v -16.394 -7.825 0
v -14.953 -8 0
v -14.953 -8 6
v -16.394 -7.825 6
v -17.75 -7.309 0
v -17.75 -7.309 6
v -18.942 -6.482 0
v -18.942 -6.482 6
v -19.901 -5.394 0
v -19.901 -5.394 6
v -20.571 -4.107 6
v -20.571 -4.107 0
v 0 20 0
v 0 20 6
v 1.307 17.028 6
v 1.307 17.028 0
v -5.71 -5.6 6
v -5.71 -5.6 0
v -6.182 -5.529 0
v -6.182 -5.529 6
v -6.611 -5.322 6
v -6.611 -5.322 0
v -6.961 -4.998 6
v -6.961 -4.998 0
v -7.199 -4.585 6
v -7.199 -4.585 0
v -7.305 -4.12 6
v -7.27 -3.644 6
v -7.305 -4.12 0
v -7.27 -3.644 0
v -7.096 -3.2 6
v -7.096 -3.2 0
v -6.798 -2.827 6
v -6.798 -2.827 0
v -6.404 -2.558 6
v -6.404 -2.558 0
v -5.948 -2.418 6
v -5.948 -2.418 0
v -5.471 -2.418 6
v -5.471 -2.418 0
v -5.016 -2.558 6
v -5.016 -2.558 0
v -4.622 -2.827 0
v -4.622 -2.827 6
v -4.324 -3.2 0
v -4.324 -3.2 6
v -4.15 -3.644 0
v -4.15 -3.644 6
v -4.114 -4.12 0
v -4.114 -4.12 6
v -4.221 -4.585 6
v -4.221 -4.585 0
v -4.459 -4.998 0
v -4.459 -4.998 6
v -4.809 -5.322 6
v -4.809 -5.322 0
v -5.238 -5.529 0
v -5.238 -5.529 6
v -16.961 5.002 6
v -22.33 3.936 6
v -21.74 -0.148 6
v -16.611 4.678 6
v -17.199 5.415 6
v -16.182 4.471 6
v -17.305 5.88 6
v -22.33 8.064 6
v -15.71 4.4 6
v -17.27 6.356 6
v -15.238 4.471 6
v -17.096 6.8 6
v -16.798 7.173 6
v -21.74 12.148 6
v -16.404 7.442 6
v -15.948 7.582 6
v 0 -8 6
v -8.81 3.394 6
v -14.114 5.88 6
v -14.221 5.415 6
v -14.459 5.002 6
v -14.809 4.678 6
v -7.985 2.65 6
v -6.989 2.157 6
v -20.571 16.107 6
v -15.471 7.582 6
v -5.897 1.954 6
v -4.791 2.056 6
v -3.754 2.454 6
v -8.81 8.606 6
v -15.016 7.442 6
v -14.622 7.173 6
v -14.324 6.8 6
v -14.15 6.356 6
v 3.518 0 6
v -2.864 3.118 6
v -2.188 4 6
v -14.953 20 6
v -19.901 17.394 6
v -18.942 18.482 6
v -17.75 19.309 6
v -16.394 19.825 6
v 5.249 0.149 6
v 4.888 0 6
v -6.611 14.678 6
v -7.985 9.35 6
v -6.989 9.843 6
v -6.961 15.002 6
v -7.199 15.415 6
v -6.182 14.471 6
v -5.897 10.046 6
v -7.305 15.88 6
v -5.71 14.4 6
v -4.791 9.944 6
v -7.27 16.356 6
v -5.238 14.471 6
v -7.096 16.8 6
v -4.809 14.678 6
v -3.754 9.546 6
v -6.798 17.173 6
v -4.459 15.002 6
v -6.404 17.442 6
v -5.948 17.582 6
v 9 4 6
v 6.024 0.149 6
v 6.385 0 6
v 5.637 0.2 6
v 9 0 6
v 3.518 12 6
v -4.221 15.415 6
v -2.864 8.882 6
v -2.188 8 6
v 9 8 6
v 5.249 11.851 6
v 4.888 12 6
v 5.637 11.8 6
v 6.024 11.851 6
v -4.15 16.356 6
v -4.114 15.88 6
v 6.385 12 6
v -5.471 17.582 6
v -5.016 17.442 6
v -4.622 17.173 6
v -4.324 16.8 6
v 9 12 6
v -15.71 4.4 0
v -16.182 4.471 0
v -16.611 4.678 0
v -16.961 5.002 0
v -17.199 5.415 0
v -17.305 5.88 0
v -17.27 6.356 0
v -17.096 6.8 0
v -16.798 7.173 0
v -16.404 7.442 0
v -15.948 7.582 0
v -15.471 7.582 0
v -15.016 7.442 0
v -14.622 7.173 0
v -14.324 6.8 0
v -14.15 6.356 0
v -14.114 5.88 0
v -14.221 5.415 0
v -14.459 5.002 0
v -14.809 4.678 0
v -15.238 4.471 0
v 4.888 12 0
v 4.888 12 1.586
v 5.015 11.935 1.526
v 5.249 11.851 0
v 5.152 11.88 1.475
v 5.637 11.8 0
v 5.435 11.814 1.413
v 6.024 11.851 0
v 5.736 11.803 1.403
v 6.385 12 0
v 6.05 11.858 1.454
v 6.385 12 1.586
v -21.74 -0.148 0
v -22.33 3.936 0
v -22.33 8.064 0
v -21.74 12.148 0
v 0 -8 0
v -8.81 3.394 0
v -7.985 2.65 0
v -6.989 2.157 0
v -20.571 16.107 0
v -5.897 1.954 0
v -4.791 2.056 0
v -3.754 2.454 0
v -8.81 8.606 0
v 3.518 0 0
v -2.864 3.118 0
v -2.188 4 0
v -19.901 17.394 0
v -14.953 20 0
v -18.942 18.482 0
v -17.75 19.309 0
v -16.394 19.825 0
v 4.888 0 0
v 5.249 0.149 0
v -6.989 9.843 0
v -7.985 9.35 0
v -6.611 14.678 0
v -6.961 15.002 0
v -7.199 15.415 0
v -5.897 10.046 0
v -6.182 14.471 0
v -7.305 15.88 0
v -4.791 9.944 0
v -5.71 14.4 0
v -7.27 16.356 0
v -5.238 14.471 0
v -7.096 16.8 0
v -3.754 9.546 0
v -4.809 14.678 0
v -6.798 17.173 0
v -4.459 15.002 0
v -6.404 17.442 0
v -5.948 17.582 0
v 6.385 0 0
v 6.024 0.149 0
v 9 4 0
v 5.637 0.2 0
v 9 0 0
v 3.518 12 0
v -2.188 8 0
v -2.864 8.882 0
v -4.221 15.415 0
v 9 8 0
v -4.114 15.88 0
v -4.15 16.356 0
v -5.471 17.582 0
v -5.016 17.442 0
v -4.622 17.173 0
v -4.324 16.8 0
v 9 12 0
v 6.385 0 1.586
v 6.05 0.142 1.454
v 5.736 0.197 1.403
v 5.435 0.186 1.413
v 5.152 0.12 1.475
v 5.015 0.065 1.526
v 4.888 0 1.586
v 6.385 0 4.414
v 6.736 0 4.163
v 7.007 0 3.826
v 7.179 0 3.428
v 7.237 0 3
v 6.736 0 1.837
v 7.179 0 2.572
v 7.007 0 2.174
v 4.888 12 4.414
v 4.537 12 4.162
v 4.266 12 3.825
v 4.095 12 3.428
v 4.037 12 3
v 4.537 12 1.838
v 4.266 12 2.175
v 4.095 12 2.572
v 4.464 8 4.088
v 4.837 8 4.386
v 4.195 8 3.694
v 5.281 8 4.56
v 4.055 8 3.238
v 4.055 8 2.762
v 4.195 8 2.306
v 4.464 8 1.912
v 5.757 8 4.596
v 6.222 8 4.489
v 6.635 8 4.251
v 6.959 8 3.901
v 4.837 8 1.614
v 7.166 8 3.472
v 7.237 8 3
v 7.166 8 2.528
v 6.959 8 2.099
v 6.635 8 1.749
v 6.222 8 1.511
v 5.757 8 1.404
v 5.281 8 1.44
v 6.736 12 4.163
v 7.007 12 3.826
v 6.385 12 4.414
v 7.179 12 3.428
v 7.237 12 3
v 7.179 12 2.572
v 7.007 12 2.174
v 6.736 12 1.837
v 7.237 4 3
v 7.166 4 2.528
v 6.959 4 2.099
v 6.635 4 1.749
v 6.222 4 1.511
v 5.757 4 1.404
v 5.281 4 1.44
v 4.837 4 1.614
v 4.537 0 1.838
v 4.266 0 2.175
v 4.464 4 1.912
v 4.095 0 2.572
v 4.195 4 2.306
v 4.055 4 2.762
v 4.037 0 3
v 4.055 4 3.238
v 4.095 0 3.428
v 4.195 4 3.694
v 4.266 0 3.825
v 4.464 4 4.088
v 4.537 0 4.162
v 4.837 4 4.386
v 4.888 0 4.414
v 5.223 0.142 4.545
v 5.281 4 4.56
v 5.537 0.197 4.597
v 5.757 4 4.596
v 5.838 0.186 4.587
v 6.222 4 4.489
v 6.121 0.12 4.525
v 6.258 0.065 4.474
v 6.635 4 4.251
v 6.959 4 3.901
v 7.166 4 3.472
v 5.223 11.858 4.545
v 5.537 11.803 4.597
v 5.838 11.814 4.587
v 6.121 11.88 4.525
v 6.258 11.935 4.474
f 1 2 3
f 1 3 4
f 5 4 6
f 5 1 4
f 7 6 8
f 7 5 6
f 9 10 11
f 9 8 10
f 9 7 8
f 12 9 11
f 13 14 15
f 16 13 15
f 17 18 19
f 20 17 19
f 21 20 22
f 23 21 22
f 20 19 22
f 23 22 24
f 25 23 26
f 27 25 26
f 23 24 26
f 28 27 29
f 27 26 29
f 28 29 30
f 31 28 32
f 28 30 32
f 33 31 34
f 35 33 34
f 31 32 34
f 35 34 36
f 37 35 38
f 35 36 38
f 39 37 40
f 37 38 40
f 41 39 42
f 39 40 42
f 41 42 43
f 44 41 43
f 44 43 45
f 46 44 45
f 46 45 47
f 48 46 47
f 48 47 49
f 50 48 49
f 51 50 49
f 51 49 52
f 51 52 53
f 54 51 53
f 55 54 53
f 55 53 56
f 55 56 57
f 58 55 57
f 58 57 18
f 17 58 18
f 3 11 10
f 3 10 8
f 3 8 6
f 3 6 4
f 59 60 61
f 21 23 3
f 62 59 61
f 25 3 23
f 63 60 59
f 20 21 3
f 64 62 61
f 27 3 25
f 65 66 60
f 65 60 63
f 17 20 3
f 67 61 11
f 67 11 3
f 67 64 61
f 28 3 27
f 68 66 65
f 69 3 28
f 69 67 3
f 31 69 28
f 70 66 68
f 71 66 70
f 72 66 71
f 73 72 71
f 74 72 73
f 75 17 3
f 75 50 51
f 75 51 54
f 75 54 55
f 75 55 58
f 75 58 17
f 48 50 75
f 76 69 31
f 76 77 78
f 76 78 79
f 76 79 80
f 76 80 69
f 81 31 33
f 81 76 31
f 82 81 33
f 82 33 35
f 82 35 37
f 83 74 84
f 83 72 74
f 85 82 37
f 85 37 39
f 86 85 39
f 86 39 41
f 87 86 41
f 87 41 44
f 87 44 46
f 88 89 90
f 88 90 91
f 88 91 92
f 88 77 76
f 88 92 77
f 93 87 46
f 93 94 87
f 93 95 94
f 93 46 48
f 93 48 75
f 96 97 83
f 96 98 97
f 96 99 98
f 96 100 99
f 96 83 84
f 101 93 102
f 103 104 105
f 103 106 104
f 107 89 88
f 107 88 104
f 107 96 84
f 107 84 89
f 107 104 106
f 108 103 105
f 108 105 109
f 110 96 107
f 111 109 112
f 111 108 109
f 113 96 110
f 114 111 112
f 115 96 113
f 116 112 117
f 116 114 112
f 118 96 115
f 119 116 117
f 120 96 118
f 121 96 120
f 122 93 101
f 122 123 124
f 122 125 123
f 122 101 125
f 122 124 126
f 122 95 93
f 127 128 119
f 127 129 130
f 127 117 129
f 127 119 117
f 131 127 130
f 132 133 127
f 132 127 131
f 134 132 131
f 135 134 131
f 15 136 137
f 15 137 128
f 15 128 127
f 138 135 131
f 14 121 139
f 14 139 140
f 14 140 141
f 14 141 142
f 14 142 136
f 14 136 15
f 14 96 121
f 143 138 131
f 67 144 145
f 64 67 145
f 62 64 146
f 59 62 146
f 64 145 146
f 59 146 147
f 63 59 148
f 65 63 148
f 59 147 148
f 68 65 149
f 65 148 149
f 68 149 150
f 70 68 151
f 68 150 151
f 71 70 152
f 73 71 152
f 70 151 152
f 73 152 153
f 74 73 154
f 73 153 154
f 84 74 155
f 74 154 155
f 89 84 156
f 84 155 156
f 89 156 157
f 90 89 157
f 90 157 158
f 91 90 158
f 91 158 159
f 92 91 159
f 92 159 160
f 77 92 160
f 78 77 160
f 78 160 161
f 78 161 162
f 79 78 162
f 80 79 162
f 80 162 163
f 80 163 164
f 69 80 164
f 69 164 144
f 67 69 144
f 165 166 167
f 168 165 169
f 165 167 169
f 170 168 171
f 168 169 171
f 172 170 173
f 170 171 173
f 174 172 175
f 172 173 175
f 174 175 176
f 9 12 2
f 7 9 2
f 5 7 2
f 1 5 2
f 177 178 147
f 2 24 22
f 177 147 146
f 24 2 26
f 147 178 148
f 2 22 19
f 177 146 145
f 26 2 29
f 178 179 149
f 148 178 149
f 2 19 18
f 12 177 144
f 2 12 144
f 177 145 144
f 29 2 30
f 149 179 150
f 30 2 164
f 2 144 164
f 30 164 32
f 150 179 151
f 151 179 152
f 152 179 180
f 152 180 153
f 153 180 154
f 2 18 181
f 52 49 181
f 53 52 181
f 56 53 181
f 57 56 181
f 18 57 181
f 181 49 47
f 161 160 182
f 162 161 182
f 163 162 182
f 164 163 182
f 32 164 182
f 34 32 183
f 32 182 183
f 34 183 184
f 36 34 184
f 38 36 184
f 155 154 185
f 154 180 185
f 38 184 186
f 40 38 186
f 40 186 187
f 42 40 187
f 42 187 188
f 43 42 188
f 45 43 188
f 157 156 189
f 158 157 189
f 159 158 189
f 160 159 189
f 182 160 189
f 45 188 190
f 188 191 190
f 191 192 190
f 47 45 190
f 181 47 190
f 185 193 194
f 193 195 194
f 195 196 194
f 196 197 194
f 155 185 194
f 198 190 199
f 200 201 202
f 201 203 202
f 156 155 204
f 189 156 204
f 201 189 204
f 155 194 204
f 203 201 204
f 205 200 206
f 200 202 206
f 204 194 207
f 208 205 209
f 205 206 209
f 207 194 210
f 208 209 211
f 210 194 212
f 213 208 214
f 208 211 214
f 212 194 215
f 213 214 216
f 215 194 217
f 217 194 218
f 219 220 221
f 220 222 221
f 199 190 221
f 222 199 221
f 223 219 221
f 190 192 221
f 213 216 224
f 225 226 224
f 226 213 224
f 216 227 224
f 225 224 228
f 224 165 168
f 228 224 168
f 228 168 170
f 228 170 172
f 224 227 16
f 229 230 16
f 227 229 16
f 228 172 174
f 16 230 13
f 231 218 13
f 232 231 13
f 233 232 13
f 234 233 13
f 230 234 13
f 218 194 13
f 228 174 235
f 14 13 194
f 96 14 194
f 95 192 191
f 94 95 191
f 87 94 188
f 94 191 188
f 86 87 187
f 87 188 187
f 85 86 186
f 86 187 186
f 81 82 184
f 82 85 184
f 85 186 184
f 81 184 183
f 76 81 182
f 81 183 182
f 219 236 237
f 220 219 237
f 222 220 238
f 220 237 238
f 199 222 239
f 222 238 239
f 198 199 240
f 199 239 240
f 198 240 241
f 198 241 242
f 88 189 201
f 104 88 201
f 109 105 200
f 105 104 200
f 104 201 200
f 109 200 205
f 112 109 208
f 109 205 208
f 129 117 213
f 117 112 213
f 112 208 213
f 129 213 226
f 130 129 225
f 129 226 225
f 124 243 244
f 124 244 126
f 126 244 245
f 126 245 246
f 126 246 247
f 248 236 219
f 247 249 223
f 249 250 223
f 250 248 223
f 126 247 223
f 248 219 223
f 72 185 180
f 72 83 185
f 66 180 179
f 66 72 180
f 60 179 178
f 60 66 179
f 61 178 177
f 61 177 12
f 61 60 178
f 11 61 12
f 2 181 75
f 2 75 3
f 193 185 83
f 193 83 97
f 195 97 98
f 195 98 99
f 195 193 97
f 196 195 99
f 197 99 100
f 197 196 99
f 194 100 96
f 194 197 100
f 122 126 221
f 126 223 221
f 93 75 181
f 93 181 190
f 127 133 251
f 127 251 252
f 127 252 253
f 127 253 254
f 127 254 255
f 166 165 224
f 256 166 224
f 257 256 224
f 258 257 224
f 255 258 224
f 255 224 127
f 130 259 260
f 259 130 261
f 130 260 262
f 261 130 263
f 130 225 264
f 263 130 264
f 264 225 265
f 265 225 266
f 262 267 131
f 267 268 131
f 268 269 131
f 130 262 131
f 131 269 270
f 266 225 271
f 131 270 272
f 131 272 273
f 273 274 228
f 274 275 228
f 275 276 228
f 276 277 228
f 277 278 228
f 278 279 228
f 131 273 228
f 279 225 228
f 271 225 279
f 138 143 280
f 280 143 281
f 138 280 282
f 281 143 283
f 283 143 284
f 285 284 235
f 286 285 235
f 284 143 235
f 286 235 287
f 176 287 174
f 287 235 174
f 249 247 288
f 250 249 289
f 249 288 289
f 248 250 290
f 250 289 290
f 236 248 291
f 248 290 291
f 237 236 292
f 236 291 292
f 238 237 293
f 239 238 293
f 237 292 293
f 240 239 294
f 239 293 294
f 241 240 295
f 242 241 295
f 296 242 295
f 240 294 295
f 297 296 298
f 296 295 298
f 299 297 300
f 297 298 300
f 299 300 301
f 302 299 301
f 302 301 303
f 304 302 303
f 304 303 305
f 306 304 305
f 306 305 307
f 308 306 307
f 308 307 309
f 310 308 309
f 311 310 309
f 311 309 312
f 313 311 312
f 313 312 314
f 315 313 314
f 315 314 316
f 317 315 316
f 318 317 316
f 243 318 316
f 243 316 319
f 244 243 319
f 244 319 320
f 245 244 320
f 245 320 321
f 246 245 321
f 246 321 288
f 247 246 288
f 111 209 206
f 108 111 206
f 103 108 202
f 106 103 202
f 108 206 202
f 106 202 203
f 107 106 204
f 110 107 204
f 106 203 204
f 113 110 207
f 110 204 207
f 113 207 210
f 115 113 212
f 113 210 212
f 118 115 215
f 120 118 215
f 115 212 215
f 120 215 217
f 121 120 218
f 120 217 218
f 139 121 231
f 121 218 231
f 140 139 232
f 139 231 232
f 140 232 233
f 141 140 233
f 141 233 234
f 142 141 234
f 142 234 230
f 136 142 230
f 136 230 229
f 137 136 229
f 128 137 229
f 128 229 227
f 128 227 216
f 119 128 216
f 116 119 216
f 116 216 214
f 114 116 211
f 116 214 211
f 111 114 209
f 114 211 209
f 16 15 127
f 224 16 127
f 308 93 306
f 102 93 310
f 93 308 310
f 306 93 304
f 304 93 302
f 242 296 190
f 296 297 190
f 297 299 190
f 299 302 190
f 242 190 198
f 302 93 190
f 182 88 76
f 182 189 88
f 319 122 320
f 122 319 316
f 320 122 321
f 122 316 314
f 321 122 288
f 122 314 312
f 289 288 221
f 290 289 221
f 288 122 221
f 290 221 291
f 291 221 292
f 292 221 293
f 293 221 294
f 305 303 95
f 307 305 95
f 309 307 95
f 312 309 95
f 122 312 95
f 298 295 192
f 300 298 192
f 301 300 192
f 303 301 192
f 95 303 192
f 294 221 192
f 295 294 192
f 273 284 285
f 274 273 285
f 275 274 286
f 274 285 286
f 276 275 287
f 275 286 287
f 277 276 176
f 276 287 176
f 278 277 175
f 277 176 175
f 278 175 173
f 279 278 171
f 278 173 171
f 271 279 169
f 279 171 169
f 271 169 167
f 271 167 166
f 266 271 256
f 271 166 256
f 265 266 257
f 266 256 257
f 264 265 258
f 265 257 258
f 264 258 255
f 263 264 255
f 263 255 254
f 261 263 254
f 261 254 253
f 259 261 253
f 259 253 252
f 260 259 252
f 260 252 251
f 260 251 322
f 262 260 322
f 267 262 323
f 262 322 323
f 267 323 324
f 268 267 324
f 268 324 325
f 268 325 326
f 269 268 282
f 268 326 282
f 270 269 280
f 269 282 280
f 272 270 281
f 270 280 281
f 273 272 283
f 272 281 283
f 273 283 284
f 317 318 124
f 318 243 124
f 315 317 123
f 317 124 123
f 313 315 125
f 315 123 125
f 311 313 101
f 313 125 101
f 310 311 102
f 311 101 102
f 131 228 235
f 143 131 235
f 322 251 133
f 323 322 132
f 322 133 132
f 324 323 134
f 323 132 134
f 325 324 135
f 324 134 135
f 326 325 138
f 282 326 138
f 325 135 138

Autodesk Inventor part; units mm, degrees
ref_plane "YZ Plane" through (0, 0, 0) normal (1, 0, 0) x (0, 1, 0)
ref_plane "XZ Plane" through (0, 0, 0) normal (0, 1, 0) x (-1, 0, 0)
ref_plane "XY Plane" through (0, 0, 0) normal (0, 0, 1) x (1, 0, 0)
sketch "スケッチ1" plane through (0, 0, 0) normal (0, 0, 1) x (1, 0, 0)
  line L0 (9, 0) -> (9, 4)
  line L1 (9, 12) -> (2.2731, 12)
  line L2 (0, 8) -> (9, 8)
  line L3 (0, 4) -> (9, 4)
  line L4 (9, 8) -> (9, 12)
  line L5 (2.2731, 12) -> (0, 14.2779)
  line L6 (2.2731, 0) -> (-5.7099, -8)
  line L7 (-5.7099, 20) -> (-15.7099, 20)
  line L8 (-5.7099, -8) -> (-15.7099, -8)
  line L9 (-15.7099, 20) -> (-25.7698, 20)
  line L10 (-25.7698, 20) -> (-25.7698, -8)
  line L11 (-25.7698, -8) -> (-15.7099, -8)
  line L12 (2.2731, 0) -> (9, 0)
  line L13 (0, 14.2779) -> (-5.7099, 20)
  arc A0 (-2.1881, 8) -> (-8.8099, 8.6062) centre (-5.7099, 6) ccw
  line L14 (0, 8) -> (-2.1881, 8)
  line L15 (0, 4) -> (-2.1881, 4)
  line L16 (-8.8099, 8.6062) -> (-8.8099, 3.3938)
  arc A1 (-8.8099, 3.3938) -> (-2.1881, 4) centre (-5.7099, 6) ccw
  point P0 (0, 0)
  point P1 (4.5, 12)
  point P2 (4.5, 0)
  point P3 (4.5, 4)
  point P4 (-25.7099, 6)
  point P5 (-8.8099, 6)
  dimension "d5" = 4
  dimension "d8" = 10
  dimension "d9" = 10
  dimension "d12" = 14
  dimension "d90" = 8.1
  dimension "d91" = 3.1
extrude "押し出し1" add sketch "スケッチ1" along normal blind 6
sketch "スケッチ2" plane through (0, 0, 6) normal (0, 0, 1) x (1, 0, 0)
  circle A0 centre (5.6365, 13.3) radius 1.5
  line L0 (9, 8) -> (9, 12) projected
  line L1 (11.5477, 6) -> (-28.1936, 6) construction
  line L2 (9, 12) -> (2.2731, 12) projected
  circle A1 centre (5.6365, -1.3) radius 1.5
  point P0 (0, 0)
  point P1 (4.8882, 12)
  point P2 (6.3849, 12)
  dimension "d15" = 3
  dimension "d16" = 3.3635
  dimension "d17" = 1.3
extrude "押し出し2" cut sketch "スケッチ2" against normal blind 6 contours A0 L2 | A1 picked at (5.4614, 13.0013)
sketch "スケッチ3" plane through (0, 0, 6) normal (0, 0, 1) x (1, 0, 0)
  circle A0 centre (5.6365, 13.3) radius 1.5
  line L0 (9, 12) -> (2.2731, 12) projected
  point P0 (0, 0)
  point P1 (4.8882, 12)
  point P2 (6.3849, 12)
  dimension "d20" = 3
  dimension "d21" = 1.3
extrude "押し出し3" add sketch "スケッチ3" against normal blind 6 contours A0 L0 picked at (5.4614, 13.0013)
sketch "スケッチ4" plane through (0, 0, 6) normal (0, 0, 1) x (1, 0, 0)
  arc A0 (6.3849, 12) -> (4.8882, 12) centre (5.6365, 13.3) ccw projected
  circle A1 centre (5.6365, 13.3) radius 1.5
  point P0 (0, 0)
  dimension "d24" = 3
extrude "押し出し4" cut sketch "スケッチ4" against normal blind 6
fillet "フィレット1" radius 5 1 edges at (-25.7698, 20, 3)
fillet "フィレット2" radius 5 1 edges at (-25.7698, -8, 3)
fillet "フィレット3" radius 3 4 edges at (-5.7099, -8, 3) (2.2731, 0, 3) (-5.7099, 20, 3) (2.2731, 12, 3)
sketch "スケッチ6" plane through (0, 4, 0) normal (0, 1, 0) x (1, 0, 0)
  point P0 (0, 0)
sketch "スケッチ7" plane through (4.8882, 12, 6) normal (0, 1, 0) x (1, 0, 0)
  circle A0 centre (0.7488, 3) radius 1.6
  line L0 (1.4967, 0) -> (0, 0) projected
  line L1 (4.1118, 6) -> (4.1118, 0) projected
  point P0 (-4.8882, 6)
  point P1 (0.7483, 0)
  dimension "d43" = 3.2
  dimension "d44" = 3
  dimension "d45" = 3.363
extrude "押し出し5" cut sketch "スケッチ7" against normal blind 28
sketch "スケッチ11" plane through (0, 0, 6) normal (0, 0, 1) x (1, 0, 0)
  line L0 (-6.9544, 20) -> (-20.7698, 20) projected
  line L1 (-20.7698, 20) -> (-6.9544, 20)
  arc A0 (1.394, 12.8809) -> (3.5176, 12) centre (3.5176, 15) ccw projected
  line L2 (0, 20) -> (1.3068, 17.0279)
  arc A1 (1.394, 12.8809) -> (3.5176, 12) centre (3.5176, 15) ccw
  arc A2 (-4.8308, 19.1191) -> (-6.9544, 20) centre (-6.9544, 17) ccw projected
  arc A3 (-4.8308, 19.1191) -> (-6.9544, 20) centre (-6.9544, 17) ccw
  line L3 (1.394, 12.8809) -> (-4.8308, 19.1191) projected
  line L4 (-4.8308, 19.1191) -> (1.394, 12.8809)
  arc A4 (0, 8) -> (0, 4) centre (-5.7099, 6) ccw projected
  line L5 (-11.7599, 6) -> (12.1155, 6) construction
  line L6 (-20.7698, -8) -> (0, -8)
  line L7 (0, -8) -> (3.5176, 0)
  arc A5 (-6.9544, -8) -> (-4.8308, -7.1191) centre (-6.9544, -5) ccw
  line L8 (1.394, -0.8809) -> (-4.8308, -7.1191)
  line L9 (-6.9544, 20) -> (0, 20)
  line L10 (1.3068, 17.0279) -> (3.5176, 12)
  arc A6 (3.5176, 0) -> (1.394, -0.8809) centre (3.5176, -3) ccw
  point P0 (0, 0)
extrude "押し出し6" add sketch "スケッチ11" against normal blind 6
sketch "スケッチ12" plane through (0, 0, 6) normal (0, 0, 1) x (1, 0, 0)
  arc A0 (0, 8) -> (0, 4) centre (-5.7099, 6) ccw projected
  point P0 (0, 0)
  point P1 (-15.7099, 6)
  point P2 (-5.7099, 16)
  point P3 (-5.7099, -4)
  dimension "d74" = 10
  dimension "d76" = 10
  dimension "d77" = 10
hole "穴4" at (-15.7099, 6, 6) at (-5.7099, 16, 6) at (-5.7099, -4, 6) direction (0, 0, -1) diameter 3.2 end through all
sketch "スケッチ13" plane through (0, 0, 6) normal (0, 0, 1) x (1, 0, 0)
  line L0 (-20.7698, -8) -> (0, -8) projected
  line L1 (0, 20) -> (-20.7698, 20) projected
  line L2 (-18.7698, 20) -> (-18.7698, -8) construction
  line L3 (-25.7698, 15) -> (-25.7698, -3) projected
  arc A0 (-18.7698, 20) -> (-18.7698, -8) centre (6.3784, 6) ccw
  line L4 (-18.7698, 20) -> (-29.3351, 20)
  line L5 (-29.3351, 20) -> (-29.3351, -8)
  line L6 (-29.3351, -8) -> (-18.7698, -8)
  point P0 (0, 0)
  dimension "d85" = 7
extrude "押し出し7" cut sketch "スケッチ13" against normal blind 6
fillet "フィレット4" radius 6 1 edges at (-18.7698, 20, 3)
fillet "フィレット5" radius 6 1 edges at (-18.7698, -8, 3)
properties part number "射出_腕固定3_真" material "ポリカーボネート、クリア"
